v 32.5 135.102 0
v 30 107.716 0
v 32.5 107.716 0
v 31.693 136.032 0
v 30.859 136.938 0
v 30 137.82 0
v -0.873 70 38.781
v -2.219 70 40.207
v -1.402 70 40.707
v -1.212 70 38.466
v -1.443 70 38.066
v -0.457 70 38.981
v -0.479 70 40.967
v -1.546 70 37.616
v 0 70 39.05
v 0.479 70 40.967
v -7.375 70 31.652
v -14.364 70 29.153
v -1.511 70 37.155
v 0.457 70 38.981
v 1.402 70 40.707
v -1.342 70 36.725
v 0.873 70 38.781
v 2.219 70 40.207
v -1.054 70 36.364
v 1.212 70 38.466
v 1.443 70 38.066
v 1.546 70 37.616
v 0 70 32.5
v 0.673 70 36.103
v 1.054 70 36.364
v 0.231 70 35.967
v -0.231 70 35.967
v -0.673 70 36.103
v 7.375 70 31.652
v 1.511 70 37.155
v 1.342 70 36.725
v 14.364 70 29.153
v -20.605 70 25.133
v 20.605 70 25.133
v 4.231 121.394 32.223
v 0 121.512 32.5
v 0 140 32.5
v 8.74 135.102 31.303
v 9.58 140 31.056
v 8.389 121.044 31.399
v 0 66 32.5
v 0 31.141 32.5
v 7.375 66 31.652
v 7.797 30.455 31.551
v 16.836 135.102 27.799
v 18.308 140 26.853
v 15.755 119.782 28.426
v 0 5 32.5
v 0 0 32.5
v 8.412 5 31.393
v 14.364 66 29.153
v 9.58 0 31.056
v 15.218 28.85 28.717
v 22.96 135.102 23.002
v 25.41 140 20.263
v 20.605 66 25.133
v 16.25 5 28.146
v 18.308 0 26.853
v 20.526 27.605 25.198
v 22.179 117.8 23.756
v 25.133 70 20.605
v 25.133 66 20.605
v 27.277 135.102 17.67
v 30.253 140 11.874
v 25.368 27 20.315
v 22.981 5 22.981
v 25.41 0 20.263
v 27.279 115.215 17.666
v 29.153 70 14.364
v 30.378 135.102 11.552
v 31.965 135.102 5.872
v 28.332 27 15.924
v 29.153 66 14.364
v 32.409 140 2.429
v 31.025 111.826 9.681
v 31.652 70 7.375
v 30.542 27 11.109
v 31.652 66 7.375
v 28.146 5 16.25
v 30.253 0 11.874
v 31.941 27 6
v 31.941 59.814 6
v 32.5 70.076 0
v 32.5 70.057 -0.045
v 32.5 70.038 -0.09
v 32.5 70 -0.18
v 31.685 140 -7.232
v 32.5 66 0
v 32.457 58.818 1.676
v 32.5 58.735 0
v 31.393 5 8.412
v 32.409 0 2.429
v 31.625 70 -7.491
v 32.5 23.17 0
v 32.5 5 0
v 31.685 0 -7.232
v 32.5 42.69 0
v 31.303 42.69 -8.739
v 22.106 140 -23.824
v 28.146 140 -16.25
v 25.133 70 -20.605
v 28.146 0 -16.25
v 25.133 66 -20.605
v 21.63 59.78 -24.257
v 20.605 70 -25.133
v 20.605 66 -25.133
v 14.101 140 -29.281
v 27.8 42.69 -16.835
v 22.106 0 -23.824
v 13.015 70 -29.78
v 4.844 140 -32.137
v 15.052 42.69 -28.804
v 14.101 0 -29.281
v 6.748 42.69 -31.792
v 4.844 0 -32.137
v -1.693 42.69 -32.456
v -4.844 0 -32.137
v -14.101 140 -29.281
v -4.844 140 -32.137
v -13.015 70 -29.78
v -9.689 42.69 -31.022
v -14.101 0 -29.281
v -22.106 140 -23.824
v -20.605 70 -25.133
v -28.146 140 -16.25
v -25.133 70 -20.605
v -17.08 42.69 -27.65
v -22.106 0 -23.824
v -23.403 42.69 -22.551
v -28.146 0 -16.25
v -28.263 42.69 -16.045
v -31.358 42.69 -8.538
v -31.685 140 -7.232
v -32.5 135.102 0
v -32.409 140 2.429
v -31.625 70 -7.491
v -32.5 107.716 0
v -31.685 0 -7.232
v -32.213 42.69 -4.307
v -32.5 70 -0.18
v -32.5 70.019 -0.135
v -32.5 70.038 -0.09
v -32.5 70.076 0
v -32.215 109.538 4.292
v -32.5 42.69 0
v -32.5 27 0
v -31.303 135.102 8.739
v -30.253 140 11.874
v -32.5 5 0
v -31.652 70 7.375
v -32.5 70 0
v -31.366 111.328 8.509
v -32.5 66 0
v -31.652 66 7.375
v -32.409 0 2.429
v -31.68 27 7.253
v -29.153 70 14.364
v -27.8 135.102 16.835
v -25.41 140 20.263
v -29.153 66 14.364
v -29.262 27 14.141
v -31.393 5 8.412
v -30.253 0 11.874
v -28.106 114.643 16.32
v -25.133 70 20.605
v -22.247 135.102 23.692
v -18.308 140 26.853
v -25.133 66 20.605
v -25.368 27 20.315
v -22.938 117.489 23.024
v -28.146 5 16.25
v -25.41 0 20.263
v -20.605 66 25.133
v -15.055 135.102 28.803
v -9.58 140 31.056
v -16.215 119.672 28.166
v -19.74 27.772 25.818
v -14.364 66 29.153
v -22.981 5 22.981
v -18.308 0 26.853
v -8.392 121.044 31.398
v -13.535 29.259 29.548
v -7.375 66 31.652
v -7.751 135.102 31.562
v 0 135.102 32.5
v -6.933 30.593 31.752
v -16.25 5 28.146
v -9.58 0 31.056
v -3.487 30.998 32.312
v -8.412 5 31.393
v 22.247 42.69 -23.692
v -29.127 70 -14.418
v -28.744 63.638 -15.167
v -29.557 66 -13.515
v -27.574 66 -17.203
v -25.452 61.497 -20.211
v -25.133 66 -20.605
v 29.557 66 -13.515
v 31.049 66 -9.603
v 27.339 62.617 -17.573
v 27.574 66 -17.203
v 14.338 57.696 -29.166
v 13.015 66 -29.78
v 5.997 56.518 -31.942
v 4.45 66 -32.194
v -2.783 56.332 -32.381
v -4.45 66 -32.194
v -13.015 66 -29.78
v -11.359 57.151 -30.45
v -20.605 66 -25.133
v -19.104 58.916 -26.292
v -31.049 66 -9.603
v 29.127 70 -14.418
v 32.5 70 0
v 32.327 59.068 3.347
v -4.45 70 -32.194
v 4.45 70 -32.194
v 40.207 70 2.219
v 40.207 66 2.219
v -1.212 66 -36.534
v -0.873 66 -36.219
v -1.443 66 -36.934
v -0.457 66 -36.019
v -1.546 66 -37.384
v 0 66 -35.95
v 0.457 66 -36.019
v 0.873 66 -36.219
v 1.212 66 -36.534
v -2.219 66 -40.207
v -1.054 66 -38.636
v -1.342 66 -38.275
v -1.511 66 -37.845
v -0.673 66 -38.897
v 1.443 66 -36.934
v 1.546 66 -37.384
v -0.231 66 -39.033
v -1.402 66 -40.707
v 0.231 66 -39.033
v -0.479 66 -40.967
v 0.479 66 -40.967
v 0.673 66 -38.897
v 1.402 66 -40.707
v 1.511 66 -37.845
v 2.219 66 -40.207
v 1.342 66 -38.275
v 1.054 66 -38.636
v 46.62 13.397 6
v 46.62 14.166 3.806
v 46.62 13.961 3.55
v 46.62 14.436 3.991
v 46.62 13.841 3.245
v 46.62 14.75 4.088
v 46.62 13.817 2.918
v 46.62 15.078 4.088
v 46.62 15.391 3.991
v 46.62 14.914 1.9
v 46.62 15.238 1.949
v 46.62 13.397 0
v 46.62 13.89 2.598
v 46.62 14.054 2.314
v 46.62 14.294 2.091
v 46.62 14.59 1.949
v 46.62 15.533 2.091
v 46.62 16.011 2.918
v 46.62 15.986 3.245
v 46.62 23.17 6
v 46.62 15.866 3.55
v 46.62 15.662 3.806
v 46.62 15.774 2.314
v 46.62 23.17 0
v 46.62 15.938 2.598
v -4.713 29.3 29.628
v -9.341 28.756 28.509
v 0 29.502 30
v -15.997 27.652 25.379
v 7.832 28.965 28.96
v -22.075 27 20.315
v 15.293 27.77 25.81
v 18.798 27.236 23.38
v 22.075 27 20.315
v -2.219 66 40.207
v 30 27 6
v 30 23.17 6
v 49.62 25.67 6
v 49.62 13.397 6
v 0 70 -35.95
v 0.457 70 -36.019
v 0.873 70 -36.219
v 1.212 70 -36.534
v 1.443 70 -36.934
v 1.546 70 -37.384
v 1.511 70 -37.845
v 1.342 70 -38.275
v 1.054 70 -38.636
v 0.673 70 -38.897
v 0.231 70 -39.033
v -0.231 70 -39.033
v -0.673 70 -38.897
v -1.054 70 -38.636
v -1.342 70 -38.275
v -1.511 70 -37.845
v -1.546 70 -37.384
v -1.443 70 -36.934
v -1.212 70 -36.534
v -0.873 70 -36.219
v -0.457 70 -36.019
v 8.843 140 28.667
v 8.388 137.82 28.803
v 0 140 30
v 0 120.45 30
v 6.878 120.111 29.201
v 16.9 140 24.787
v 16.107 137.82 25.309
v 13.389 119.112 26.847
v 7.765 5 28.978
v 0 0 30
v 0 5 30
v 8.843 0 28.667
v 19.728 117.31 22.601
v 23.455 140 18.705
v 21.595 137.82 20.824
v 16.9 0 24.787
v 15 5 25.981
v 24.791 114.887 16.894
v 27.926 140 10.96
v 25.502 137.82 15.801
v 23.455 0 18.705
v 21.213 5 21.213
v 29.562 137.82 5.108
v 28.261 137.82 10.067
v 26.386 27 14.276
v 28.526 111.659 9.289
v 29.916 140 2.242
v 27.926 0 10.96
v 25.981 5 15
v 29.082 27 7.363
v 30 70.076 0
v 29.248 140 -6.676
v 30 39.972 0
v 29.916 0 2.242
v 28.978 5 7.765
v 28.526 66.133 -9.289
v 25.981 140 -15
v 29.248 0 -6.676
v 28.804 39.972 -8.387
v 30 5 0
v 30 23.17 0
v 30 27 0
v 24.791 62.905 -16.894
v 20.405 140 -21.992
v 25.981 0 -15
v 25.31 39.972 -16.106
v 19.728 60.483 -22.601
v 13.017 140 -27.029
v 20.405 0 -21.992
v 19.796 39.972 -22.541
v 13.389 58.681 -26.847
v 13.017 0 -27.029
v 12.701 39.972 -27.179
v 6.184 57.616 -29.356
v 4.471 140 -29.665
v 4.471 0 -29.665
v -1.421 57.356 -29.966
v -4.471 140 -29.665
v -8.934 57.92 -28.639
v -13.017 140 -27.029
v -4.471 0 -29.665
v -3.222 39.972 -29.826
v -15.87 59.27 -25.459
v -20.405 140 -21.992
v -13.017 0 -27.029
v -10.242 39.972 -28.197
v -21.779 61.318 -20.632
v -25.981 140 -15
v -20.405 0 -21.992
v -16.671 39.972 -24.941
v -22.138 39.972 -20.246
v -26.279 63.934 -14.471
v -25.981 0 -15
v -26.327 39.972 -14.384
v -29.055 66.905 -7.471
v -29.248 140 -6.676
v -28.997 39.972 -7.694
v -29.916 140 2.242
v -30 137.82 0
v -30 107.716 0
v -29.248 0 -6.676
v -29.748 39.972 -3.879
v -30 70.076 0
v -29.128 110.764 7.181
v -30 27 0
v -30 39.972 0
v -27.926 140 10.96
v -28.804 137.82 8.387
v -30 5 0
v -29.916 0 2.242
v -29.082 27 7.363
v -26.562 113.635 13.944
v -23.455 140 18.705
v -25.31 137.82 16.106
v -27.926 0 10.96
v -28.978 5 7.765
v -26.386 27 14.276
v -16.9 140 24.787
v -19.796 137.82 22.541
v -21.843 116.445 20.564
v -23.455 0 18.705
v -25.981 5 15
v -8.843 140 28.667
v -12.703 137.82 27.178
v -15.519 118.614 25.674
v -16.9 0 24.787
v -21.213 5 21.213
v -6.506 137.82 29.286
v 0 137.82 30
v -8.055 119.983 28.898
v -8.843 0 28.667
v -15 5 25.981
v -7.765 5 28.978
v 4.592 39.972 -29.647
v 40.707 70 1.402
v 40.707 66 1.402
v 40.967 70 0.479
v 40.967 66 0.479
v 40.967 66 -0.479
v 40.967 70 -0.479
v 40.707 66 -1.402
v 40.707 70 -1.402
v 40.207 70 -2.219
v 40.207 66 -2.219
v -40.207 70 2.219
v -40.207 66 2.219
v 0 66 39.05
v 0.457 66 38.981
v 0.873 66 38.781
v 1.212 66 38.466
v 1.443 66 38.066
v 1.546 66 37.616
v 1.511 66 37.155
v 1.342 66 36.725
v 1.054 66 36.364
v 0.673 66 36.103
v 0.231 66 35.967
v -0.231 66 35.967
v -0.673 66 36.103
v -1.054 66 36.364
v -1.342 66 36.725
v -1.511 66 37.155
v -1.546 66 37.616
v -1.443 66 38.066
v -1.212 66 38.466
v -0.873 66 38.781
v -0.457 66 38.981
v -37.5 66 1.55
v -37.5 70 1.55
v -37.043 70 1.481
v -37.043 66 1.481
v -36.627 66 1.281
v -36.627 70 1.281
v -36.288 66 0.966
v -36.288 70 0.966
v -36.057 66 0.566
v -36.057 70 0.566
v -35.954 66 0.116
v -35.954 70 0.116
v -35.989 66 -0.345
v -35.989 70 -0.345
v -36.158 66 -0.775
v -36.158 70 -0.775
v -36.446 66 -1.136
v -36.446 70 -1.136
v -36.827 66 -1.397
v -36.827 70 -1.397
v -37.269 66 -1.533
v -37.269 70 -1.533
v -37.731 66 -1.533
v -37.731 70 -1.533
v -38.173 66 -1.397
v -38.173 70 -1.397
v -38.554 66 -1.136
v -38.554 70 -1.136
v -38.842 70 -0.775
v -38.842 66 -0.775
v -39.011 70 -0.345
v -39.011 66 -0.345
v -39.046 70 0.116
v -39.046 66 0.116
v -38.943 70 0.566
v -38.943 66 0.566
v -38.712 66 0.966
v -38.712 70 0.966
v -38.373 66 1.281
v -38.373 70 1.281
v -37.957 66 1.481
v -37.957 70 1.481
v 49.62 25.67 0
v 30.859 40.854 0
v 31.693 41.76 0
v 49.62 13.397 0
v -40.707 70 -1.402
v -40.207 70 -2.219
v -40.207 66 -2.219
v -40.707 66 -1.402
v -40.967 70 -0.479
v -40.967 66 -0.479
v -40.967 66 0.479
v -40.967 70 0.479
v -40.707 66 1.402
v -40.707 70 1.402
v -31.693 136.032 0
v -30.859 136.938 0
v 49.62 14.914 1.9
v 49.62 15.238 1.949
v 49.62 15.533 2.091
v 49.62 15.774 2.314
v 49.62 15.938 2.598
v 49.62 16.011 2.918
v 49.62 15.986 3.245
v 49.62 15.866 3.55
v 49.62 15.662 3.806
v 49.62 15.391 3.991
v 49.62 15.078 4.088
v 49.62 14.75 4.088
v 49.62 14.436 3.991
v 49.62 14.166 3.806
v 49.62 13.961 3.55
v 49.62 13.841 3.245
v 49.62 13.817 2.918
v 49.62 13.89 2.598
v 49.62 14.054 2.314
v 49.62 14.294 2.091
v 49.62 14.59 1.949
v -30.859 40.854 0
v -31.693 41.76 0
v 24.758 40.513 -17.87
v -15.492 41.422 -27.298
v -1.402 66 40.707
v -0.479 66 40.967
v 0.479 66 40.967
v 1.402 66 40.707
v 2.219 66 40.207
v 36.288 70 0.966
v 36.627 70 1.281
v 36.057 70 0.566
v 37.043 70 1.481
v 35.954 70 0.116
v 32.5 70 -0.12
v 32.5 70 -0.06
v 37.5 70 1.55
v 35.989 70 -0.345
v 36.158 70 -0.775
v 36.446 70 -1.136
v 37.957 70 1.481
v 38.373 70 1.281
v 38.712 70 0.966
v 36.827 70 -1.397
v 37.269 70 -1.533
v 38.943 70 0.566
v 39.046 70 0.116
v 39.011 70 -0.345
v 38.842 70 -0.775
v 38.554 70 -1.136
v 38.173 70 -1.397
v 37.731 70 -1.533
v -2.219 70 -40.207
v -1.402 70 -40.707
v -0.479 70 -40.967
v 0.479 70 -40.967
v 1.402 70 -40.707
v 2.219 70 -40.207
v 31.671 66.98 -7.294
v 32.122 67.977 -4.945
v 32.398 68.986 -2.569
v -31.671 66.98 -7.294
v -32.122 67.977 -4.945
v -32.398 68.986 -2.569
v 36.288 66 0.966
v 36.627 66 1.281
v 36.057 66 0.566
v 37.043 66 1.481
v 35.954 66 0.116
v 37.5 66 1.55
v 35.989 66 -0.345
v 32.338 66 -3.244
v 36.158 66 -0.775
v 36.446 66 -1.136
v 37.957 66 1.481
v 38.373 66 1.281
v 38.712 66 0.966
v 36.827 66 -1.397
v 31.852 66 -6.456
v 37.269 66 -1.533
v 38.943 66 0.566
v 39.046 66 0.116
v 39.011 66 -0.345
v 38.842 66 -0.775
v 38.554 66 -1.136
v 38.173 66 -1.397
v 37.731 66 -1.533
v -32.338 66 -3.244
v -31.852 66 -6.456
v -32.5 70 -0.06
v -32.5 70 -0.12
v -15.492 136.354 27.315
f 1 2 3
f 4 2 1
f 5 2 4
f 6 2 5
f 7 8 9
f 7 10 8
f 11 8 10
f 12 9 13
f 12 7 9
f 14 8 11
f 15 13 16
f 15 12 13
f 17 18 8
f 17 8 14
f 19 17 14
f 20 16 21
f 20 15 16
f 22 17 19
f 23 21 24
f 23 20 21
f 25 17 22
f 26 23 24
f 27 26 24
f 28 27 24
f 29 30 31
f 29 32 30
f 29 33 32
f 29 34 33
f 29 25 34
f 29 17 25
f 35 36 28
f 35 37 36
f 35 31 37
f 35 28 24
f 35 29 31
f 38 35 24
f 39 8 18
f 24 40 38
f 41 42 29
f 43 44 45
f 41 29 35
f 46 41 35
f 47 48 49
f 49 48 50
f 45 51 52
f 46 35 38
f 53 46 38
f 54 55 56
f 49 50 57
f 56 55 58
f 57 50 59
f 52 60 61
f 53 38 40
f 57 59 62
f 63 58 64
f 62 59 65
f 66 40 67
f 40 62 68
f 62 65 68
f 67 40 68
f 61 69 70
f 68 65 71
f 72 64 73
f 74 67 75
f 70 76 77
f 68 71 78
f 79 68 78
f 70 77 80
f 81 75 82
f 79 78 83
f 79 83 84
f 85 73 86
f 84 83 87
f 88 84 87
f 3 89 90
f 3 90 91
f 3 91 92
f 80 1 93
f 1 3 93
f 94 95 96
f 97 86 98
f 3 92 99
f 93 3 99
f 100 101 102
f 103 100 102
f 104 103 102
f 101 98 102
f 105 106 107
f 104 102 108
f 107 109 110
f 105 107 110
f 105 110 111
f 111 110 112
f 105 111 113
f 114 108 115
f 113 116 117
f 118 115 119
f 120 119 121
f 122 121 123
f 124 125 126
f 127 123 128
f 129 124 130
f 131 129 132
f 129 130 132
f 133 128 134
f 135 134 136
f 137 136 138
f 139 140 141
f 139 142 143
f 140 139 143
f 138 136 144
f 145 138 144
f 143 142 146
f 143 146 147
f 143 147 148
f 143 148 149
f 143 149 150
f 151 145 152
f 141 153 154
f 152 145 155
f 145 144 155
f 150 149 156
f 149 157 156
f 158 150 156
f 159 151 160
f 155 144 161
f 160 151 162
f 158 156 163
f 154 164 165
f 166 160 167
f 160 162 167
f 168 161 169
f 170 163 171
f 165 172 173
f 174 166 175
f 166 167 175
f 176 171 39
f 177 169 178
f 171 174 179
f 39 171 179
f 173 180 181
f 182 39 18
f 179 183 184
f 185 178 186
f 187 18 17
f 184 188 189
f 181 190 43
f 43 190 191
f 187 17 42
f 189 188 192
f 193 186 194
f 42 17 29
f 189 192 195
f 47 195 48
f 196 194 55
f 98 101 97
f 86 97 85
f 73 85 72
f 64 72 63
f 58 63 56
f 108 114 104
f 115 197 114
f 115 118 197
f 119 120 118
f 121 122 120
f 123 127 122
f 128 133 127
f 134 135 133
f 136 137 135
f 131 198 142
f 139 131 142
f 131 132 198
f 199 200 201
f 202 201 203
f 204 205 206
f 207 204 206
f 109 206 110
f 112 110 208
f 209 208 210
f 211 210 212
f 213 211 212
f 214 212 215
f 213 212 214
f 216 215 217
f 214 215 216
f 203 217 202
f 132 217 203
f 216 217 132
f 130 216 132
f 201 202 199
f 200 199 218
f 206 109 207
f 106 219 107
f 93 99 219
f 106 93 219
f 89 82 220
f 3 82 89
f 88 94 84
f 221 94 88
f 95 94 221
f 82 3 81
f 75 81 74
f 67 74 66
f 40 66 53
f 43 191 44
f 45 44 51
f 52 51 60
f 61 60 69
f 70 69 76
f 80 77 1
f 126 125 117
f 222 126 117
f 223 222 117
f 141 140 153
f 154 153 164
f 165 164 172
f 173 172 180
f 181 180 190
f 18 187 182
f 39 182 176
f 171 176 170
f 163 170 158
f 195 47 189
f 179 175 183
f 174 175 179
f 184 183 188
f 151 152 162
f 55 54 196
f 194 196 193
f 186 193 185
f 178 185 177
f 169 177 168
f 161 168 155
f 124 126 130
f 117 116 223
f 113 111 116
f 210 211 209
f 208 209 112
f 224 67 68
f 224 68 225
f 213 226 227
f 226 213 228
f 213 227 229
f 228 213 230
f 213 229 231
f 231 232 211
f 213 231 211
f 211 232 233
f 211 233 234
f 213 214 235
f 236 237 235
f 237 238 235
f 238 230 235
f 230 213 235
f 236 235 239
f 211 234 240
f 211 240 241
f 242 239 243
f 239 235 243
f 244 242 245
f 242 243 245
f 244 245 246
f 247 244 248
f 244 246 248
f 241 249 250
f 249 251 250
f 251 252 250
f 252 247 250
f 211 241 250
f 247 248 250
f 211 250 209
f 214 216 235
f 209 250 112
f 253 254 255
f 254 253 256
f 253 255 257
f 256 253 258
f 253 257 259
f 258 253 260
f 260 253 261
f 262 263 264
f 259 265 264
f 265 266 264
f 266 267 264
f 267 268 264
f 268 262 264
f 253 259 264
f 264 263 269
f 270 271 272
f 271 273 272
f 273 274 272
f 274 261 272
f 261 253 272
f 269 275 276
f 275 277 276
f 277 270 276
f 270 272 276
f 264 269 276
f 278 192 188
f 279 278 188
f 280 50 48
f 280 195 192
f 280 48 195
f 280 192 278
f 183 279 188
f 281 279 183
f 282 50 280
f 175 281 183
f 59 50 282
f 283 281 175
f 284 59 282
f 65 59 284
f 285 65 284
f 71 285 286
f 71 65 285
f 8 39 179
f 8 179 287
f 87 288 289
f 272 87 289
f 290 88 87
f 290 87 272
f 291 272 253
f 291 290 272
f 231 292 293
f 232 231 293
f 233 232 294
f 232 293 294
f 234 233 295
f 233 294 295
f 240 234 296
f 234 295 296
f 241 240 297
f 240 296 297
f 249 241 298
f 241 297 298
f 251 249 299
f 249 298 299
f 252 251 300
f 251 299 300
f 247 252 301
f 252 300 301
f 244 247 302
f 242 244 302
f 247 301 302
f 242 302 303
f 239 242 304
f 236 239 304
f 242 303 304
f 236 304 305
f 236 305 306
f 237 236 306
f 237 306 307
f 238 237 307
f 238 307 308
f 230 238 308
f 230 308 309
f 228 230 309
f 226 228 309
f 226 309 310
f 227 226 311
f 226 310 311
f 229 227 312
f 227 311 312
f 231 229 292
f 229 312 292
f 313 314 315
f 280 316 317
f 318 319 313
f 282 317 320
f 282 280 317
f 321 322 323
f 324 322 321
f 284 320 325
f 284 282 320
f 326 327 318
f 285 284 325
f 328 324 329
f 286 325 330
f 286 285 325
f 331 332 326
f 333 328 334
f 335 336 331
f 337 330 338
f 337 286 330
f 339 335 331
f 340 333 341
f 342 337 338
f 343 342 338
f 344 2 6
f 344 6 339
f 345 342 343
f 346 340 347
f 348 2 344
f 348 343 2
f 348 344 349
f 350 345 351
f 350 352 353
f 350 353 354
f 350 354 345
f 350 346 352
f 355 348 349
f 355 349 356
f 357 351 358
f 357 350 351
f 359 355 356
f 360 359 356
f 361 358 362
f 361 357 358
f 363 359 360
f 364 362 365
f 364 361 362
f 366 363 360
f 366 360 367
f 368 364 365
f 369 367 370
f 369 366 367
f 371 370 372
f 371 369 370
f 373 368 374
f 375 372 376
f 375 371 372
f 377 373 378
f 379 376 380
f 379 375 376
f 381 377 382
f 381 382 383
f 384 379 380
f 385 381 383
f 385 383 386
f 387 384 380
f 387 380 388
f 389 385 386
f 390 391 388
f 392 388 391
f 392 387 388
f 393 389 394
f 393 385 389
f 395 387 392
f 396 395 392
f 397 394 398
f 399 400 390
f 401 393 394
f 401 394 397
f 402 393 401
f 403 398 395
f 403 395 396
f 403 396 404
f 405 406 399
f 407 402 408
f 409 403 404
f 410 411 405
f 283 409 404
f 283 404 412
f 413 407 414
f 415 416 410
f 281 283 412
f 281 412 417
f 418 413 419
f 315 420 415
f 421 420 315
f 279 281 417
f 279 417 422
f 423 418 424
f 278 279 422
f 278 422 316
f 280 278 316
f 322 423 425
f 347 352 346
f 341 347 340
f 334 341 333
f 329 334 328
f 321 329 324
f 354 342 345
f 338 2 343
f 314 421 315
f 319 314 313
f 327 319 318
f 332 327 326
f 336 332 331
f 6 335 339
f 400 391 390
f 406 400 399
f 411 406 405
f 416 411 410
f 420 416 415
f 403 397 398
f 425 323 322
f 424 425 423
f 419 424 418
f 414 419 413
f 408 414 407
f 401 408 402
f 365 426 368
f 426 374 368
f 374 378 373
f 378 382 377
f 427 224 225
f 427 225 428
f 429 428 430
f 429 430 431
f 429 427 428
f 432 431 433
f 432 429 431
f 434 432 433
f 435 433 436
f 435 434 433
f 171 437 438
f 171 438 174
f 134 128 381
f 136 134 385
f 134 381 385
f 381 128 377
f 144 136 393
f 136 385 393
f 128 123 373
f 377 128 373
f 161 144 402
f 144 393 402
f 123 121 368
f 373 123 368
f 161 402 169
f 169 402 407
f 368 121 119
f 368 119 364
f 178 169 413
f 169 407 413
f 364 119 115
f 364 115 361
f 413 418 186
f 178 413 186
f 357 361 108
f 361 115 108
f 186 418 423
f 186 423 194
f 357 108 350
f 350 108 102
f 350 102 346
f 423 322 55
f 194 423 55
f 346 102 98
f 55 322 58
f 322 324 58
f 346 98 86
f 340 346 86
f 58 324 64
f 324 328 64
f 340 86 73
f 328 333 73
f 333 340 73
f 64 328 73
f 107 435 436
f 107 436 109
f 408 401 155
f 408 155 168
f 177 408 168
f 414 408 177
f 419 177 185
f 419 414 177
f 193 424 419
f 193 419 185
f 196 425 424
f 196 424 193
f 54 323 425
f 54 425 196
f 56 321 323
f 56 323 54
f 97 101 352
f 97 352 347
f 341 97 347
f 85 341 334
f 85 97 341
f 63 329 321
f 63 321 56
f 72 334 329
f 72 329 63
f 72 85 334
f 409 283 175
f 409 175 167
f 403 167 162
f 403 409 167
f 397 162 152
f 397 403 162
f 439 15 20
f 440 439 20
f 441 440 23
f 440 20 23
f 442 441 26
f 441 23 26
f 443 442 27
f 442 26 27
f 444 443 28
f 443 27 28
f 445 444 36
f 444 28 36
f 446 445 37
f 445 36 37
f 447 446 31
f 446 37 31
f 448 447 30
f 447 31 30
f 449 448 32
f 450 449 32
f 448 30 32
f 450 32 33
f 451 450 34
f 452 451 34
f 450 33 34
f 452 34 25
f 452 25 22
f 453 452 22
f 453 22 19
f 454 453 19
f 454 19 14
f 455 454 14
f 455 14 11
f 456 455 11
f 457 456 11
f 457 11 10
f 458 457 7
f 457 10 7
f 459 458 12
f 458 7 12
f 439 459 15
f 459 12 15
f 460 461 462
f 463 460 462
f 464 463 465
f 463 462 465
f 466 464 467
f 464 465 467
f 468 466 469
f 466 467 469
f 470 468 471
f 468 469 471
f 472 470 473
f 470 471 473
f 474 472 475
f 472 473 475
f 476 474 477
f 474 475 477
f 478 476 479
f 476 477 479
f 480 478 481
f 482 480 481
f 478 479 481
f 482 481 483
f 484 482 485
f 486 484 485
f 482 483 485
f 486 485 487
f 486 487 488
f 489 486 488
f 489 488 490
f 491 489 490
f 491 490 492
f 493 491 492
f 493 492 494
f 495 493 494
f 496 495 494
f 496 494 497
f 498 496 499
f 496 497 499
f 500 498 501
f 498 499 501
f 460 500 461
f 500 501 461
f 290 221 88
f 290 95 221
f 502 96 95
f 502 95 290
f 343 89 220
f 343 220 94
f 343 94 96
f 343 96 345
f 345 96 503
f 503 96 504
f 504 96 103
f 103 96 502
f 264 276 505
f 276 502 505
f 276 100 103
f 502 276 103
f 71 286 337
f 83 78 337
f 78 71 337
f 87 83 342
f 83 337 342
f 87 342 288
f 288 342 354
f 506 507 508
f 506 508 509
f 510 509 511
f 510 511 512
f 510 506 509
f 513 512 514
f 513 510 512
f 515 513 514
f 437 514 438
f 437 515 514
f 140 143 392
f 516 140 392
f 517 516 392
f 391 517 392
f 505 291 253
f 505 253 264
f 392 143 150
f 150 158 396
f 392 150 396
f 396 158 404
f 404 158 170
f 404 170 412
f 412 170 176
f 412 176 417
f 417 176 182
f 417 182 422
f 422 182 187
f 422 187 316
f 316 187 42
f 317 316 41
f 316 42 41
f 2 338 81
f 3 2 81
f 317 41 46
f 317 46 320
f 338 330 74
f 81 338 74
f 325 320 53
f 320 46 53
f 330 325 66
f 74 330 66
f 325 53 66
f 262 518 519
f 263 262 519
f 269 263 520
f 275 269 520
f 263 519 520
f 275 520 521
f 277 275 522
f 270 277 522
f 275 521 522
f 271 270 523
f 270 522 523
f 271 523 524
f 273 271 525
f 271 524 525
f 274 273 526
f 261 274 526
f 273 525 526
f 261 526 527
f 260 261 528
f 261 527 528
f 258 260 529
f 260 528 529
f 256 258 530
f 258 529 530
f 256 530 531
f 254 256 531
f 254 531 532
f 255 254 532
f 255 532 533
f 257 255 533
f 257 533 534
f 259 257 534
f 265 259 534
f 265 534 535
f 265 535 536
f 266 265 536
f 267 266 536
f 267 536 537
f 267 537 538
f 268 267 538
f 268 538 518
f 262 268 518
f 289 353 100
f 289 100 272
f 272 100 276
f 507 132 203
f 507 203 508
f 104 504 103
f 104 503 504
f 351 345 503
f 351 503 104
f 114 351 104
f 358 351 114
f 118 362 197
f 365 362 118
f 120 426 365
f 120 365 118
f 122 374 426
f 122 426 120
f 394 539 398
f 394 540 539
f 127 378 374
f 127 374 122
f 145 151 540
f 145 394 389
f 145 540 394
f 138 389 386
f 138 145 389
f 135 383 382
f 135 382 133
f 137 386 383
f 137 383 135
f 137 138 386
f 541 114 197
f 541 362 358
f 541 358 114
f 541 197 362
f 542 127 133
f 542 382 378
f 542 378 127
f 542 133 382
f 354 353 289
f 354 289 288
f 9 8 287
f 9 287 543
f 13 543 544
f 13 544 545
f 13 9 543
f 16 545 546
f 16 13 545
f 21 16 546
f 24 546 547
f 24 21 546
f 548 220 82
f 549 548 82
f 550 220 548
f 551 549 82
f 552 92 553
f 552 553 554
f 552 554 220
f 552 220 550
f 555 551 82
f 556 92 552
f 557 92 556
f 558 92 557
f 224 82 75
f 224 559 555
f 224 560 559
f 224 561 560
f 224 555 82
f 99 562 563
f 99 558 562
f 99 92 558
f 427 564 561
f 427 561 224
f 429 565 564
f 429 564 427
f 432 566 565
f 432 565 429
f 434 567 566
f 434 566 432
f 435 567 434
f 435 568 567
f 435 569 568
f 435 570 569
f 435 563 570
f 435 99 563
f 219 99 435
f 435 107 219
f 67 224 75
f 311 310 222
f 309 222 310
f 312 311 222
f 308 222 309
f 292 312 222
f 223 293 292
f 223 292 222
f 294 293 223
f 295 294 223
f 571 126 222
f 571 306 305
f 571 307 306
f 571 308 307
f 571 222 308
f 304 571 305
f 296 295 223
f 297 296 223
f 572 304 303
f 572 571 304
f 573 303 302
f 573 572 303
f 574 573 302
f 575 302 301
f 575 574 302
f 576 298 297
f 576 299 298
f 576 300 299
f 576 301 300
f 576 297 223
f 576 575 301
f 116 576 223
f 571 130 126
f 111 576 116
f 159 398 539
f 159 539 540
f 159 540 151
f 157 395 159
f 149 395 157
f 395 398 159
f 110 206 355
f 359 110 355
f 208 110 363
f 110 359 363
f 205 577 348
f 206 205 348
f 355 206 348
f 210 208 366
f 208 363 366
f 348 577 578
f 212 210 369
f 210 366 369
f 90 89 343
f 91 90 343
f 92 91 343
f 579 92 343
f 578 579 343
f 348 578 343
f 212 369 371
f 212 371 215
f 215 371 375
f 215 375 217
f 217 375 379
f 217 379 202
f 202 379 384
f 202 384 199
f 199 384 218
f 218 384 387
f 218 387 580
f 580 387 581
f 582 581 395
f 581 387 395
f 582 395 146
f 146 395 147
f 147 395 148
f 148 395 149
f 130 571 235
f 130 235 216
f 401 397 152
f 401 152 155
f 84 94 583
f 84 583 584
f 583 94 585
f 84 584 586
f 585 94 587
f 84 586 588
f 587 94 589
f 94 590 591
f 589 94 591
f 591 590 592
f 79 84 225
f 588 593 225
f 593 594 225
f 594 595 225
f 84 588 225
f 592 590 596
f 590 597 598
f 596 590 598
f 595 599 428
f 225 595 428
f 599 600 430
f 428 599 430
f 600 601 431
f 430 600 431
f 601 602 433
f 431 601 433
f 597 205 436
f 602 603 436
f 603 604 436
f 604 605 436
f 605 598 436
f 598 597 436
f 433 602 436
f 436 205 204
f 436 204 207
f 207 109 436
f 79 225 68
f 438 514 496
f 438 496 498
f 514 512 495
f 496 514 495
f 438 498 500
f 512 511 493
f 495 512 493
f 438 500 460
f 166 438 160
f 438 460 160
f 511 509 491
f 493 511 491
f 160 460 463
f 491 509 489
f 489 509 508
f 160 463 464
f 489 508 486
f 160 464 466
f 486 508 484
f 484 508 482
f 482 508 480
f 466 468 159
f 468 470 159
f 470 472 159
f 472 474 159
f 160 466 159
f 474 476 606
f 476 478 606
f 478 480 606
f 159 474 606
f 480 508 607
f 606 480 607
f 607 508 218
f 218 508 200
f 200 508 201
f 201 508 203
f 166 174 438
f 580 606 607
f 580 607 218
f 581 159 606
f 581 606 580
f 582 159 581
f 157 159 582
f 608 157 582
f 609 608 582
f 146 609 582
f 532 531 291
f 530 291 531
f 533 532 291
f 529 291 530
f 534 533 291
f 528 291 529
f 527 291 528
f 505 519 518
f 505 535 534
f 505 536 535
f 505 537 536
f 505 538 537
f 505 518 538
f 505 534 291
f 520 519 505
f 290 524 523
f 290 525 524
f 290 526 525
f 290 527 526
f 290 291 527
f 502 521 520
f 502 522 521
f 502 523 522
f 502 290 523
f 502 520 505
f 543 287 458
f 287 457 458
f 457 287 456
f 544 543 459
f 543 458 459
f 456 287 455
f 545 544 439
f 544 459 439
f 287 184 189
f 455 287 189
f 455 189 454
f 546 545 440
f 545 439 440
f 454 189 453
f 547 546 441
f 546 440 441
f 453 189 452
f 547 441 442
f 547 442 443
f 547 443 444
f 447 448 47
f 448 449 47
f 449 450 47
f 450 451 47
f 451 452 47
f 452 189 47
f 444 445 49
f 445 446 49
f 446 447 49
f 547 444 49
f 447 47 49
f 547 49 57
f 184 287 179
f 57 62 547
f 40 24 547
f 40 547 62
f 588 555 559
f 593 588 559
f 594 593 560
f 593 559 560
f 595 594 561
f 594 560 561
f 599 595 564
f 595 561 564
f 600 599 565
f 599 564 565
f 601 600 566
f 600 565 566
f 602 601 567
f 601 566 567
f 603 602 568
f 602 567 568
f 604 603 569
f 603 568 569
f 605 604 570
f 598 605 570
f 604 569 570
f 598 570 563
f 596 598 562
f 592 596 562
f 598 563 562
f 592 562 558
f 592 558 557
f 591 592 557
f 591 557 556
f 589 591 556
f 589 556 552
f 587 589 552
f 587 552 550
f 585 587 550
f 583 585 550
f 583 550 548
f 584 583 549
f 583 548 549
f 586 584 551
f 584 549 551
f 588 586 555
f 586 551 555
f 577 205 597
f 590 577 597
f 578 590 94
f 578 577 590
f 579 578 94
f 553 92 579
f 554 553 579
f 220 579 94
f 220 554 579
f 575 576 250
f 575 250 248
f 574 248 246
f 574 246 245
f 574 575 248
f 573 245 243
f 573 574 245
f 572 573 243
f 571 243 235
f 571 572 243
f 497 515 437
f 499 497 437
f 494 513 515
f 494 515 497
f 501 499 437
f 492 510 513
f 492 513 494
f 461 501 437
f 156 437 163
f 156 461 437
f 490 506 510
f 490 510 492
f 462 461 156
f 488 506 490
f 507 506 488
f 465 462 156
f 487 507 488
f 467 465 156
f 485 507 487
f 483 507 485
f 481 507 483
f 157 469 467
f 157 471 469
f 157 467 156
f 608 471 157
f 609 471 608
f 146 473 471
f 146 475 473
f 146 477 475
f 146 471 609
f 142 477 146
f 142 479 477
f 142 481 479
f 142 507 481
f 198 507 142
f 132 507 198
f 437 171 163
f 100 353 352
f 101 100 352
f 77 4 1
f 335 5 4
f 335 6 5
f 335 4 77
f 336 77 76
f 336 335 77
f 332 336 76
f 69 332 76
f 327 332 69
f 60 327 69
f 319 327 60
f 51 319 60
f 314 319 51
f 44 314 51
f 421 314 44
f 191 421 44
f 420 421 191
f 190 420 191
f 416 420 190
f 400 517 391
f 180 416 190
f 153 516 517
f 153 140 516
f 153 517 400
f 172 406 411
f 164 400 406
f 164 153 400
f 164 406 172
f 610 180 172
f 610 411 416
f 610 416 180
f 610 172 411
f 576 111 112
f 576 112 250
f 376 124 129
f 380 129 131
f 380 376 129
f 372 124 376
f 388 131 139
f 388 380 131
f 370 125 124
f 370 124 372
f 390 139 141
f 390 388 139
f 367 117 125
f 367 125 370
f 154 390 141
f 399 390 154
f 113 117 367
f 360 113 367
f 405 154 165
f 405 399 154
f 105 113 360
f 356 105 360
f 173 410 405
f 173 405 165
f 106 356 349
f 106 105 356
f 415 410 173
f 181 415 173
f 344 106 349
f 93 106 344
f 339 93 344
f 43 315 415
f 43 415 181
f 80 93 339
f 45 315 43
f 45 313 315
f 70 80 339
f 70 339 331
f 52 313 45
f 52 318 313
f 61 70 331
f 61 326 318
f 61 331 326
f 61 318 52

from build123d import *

# Parameters (mm, degrees)
SKETCH1_R               = 32.5
SKETCH1_R_2             = 30
BOSS_EXTRUDE1_DEPTH     = 140
CUT_REVOLVE1_ANGLE      = 67
CUT_REVOLVE2_ANGLE      = 67
CUT_EXTRUDE1_DEPTH      = 58
CUT_EXTRUDE1_DEPTH_BACK = 50
BOSS_EXTRUDE3_START     = -70
SKETCH4_R               = 1.55
BOSS_EXTRUDE3_DEPTH     = 4
SKETCH6_W               = 19.62
SKETCH6_H               = 2.5
BOSS_EXTRUDE4_DEPTH     = 6
SKETCH7_W               = 6
SKETCH7_H               = 9.773229536
BOSS_EXTRUDE6_DEPTH     = 3
SKETCH8_W               = 2.5
SKETCH8_H               = 1.33
BOSS_EXTRUDE7_DEPTH     = 6
SKETCH9_R               = 1.1
CUT_EXTRUDE2_DEPTH      = 7
RIB3_REACH              = 156.088
SKETCH11_WALL_W         = 347.41014935
SKETCH11_WALL_H         = 6


with BuildPart() as part:
    # Sketch1 → Boss-Extrude1 (new body)
    with BuildSketch(Plane(origin=(0, 0, 0), x_dir=(1, 0, 0), z_dir=(0, 1, 0))):
        with Locations(Location((0, 0, 0), (0, 0, 270))):
            Circle(SKETCH1_R)
        with Locations(Location((0, 0, 0), (0, 0, 270))):
            Circle(SKETCH1_R_2, mode=Mode.SUBTRACT)
    extrude(amount=BOSS_EXTRUDE1_DEPTH)

    # Sketch2 → Cut-Revolve1 (revolve, cut)
    with BuildSketch(Plane.XY):
        with BuildLine():
            Line((-42.5, 107.716148379), (42.5, 107.716148379))
            ThreePointArc((42.5, 107.716148379), (0, 150.216148379), (-42.5, 107.716148379))
        make_face()
    revolve(axis=Axis((-42.5, 107.716148379, 0), (1, 0, 0)), revolution_arc=CUT_REVOLVE1_ANGLE, mode=Mode.SUBTRACT)

    # Sketch3 → Cut-Revolve2 (revolve, cut)
    with BuildSketch(Plane.XY):
        with BuildLine():
            Line((-42.5, 70.076349177), (42.5, 70.076349177))
            ThreePointArc((42.5, 70.076349177), (0, 27.576349177), (-42.5, 70.076349177))
        make_face()
    revolve(axis=Axis((-42.5, 70.076349177, 0), (1, 0, 0)), revolution_arc=CUT_REVOLVE2_ANGLE, mode=Mode.SUBTRACT)

    # Sketch5 → Cut-Extrude1 (cut, two sides)
    with BuildSketch(Plane(origin=(0, 0, 0), x_dir=(0, 0, -1), z_dir=(1, 0, 0))) as cut_extrude1_sk:
        with BuildLine():
            Line((-38.488633311, 38.604979811), (-38.087882821, 37.828391715))
            ThreePointArc((-38.087882821, 37.828391715), (-30.720780367, 29.920302027), (-20.314824517, 27))
            Line((-20.314824517, 27), (-19.990167054, 27))
            Line((-19.990167054, 27), (0, 27))
            Line((0, 27), (0, 5))
            Line((0, 5), (-38.488633311, 5))
            Line((-38.488633311, 5), (-38.488633311, 38.604979811))
        make_face()
    extrude(amount=CUT_EXTRUDE1_DEPTH, mode=Mode.SUBTRACT)
    extrude(cut_extrude1_sk.sketch, amount=-CUT_EXTRUDE1_DEPTH_BACK, mode=Mode.SUBTRACT)

    # Sketch4 → Boss-Extrude3 (add)
    with BuildSketch(Plane(origin=(0, 140, 0), x_dir=(1, 0, 0), z_dir=(0, 1, 0)).offset(BOSS_EXTRUDE3_START)):
        with BuildLine():
            Line((-2.218998773, 40.206666667), (-20.604988608, 25.133333333))
            ThreePointArc((-20.604988608, 25.133333333), (0, 32.5), (20.604988608, 25.133333333))
            Line((20.604988608, 25.133333333), (2.218998773, 40.206666667))
            ThreePointArc((2.218998773, 40.206666667), (0, 41), (-2.218998773, 40.206666667))
        make_face()
        with Locations(Location((0, 37.5, 0), (0, 0, 270))):
            Circle(SKETCH4_R, mode=Mode.SUBTRACT)
        with BuildLine():
            ThreePointArc((-25.133333333, -20.604988608), (-32.5, 0), (-25.133333333, 20.604988608))
            Line((-25.133333333, 20.604988608), (-40.206666667, 2.218998773))
            ThreePointArc((-40.206666667, 2.218998773), (-41, 0), (-40.206666667, -2.218998773))
            Line((-40.206666667, -2.218998773), (-25.133333333, -20.604988608))
        make_face()
        with Locations(Location((-37.5, 0, 0), (0, 0, 270))):
            Circle(SKETCH4_R, mode=Mode.SUBTRACT)
        with BuildLine():
            Line((40.206666667, 2.218998773), (25.133333333, 20.604988608))
            ThreePointArc((25.133333333, 20.604988608), (32.5, 0), (25.133333333, -20.604988608))
            Line((25.133333333, -20.604988608), (40.206666667, -2.218998773))
            ThreePointArc((40.206666667, -2.218998773), (41, 0), (40.206666667, 2.218998773))
        make_face()
        with Locations(Location((37.5, 0, 0), (0, 0, 270))):
            Circle(SKETCH4_R, mode=Mode.SUBTRACT)
        with BuildLine():
            ThreePointArc((20.604988608, -25.133333333), (0, -32.5), (-20.604988608, -25.133333333))
            Line((-20.604988608, -25.133333333), (-2.218998773, -40.206666667))
            ThreePointArc((-2.218998773, -40.206666667), (0, -41), (2.218998773, -40.206666667))
            Line((2.218998773, -40.206666667), (20.604988608, -25.133333333))
        make_face()
        with Locations(Location((0, -37.5, 0), (0, 0, 270))):
            Circle(SKETCH4_R, mode=Mode.SUBTRACT)
    extrude(amount=-BOSS_EXTRUDE3_DEPTH)

    # Sketch6 → Boss-Extrude4 (add)
    with BuildSketch(Plane.XY):
        with Locations((39.81, 24.42)):
            Rectangle(SKETCH6_W, SKETCH6_H)
    extrude(amount=BOSS_EXTRUDE4_DEPTH)

    # Sketch7 → Boss-Extrude6 (add)
    with BuildSketch(Plane(origin=(49.62, 0, 0), x_dir=(0, 0, -1), z_dir=(1, 0, 0))):
        with Locations((-3, 18.283385232)):
            Rectangle(SKETCH7_W, SKETCH7_H)
    extrude(amount=-BOSS_EXTRUDE6_DEPTH)

    # Sketch8 → Boss-Extrude7 (add)
    with BuildSketch(Plane.XY):
        Polygon((49.62, 25.67), (32.5, 25.67), (32.5, 27), align=None)
        with Locations((31.25, 26.335)):
            Rectangle(SKETCH8_W, SKETCH8_H)
    extrude(amount=BOSS_EXTRUDE7_DEPTH)

    # Sketch9 → Cut-Extrude2 (cut)
    with BuildSketch(Plane(origin=(49.62, 0, 0), x_dir=(0, 0, -1), z_dir=(1, 0, 0))):
        with Locations((-3, 14.913761398)):
            Circle(SKETCH9_R)
    extrude(amount=-CUT_EXTRUDE2_DEPTH, mode=Mode.SUBTRACT)

    # Sketch11 wall → Rib3 (add, up to next)
    with BuildSketch(Plane(origin=(41.06, 42.202329556, 0), x_dir=(0.459795586238, -0.888024785057, 0), z_dir=(0.888024785057, 0.459795586238, 0)), mode=Mode.PRIVATE) as rib3_sk1:
        with Locations((0, -3)):
            Rectangle(SKETCH11_WALL_W, SKETCH11_WALL_H)
    rib3_tool1 = extrude(rib3_sk1.sketch, amount=-RIB3_REACH, mode=Mode.PRIVATE) - part.part
    add(rib3_tool1.solids().sort_by_distance((41.06, 42.202329556, 0))[0])


solid = part.part
